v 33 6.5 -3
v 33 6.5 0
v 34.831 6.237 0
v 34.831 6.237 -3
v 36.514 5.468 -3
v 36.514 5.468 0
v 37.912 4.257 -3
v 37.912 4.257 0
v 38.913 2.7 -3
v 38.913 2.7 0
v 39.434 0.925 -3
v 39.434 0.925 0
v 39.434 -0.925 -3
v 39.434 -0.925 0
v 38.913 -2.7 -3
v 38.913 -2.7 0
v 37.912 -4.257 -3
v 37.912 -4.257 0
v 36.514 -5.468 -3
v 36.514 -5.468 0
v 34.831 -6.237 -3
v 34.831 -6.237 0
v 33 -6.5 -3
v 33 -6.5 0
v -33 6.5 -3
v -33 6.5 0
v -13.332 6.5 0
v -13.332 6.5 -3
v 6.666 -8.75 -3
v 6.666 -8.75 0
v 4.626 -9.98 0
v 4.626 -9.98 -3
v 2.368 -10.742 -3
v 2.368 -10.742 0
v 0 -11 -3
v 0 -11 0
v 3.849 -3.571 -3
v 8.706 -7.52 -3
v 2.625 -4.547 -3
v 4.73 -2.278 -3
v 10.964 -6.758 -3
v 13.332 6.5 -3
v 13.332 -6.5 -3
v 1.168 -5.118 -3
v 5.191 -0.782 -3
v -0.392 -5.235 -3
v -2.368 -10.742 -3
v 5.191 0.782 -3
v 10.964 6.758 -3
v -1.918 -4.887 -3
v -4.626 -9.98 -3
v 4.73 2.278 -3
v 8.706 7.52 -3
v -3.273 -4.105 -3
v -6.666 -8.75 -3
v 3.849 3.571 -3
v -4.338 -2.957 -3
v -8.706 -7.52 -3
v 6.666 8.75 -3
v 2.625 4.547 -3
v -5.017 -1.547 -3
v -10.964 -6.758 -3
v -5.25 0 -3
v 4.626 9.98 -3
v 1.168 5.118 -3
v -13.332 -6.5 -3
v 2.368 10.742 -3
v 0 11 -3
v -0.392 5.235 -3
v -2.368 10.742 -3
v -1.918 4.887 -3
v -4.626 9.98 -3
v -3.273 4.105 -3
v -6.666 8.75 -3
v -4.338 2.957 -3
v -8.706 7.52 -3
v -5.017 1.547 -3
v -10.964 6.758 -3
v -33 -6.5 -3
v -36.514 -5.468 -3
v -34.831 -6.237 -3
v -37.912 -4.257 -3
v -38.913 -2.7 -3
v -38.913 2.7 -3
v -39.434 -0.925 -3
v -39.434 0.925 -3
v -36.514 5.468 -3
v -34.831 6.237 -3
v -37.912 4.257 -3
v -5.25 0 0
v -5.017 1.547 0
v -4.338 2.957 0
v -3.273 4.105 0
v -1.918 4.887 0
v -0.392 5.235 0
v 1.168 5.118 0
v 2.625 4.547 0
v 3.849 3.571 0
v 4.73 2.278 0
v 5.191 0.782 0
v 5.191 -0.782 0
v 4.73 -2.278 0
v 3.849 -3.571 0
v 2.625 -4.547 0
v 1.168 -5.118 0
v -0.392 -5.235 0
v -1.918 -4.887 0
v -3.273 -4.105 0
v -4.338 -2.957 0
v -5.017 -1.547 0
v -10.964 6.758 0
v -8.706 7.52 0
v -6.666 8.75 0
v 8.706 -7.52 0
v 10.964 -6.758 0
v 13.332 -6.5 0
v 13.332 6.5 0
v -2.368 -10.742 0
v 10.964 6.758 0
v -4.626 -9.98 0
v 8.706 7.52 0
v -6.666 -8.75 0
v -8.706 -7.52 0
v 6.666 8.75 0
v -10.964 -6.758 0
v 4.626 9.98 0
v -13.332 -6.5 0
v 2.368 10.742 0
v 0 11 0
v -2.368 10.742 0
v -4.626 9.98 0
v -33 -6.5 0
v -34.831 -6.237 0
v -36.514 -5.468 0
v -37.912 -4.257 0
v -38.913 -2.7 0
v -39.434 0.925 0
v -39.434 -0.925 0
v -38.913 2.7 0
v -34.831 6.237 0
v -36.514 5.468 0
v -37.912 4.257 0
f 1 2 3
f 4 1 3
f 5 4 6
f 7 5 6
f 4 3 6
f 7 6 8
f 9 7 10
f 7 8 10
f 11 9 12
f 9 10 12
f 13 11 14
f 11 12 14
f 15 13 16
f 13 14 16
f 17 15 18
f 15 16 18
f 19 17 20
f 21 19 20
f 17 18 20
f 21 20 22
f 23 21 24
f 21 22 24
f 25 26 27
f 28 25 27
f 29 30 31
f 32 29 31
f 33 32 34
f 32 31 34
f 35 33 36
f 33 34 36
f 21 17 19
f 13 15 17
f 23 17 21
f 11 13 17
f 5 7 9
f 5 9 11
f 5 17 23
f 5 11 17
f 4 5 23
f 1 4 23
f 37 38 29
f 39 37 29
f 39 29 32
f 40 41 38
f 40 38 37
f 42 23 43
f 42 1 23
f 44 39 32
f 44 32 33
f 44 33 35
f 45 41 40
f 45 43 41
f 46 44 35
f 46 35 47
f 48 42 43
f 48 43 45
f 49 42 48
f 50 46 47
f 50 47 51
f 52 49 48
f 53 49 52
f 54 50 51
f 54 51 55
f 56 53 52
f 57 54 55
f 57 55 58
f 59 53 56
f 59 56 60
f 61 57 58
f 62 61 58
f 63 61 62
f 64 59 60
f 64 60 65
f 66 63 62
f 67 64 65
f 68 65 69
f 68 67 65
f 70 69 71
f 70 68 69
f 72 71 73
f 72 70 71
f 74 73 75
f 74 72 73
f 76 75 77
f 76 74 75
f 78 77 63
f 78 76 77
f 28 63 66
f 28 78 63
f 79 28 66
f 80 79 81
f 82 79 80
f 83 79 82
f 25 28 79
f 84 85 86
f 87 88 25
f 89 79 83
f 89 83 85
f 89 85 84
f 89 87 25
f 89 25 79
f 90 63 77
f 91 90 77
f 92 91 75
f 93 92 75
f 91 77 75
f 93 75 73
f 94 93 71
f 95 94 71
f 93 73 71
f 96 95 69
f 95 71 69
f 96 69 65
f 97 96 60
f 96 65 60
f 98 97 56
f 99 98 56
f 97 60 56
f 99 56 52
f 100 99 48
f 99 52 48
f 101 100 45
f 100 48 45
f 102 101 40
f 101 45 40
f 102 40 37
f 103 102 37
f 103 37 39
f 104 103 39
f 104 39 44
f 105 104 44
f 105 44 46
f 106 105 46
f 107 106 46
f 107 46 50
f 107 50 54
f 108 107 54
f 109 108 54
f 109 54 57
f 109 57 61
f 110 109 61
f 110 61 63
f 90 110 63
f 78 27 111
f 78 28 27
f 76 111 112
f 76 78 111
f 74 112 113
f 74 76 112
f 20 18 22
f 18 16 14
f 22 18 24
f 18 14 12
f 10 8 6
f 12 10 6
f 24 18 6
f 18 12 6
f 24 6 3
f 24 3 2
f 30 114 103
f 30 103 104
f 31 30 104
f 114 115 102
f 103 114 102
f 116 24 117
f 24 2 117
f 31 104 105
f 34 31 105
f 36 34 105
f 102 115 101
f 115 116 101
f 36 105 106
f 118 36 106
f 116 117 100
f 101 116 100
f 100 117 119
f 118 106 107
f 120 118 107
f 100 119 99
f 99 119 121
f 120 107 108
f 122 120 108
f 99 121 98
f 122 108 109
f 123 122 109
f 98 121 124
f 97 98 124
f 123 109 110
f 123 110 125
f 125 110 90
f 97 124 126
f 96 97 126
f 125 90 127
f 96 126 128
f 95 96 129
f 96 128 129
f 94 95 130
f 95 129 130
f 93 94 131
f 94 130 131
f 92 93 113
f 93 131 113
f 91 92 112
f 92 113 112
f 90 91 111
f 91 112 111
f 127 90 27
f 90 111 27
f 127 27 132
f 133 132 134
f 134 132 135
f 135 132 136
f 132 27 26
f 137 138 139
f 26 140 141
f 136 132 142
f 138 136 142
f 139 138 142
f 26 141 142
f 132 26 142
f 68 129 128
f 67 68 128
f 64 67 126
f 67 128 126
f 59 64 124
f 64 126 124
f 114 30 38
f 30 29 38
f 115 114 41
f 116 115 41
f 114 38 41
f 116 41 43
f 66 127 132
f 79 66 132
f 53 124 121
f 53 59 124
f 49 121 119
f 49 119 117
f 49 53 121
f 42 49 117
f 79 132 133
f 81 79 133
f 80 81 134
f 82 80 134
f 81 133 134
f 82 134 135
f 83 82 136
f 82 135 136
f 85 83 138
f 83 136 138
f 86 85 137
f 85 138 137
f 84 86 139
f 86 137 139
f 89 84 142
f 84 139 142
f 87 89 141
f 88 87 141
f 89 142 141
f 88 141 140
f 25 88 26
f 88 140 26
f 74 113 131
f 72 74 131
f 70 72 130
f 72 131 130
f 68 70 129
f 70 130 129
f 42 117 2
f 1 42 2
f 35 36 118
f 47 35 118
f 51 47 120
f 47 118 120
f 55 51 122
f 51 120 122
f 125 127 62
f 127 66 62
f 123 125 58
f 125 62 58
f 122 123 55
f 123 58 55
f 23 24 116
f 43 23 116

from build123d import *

# Parameters (mm, degrees)
FLANGE_BASE1_DEPTH    = 3
FILETE1_R             = 11
FILETE2_R             = 11
CORTE_EXTRUS_O1_REACH = 43.113
ESBO_O2_R             = 5.25


# Sheet-metal steps are written as plain solids
with BuildPart() as part:
    # Esboço1 → Flange-base1 (new body)
    with BuildSketch(Plane.XY):
        with BuildLine():
            Line((-33, 6.5), (-8.874119675, 6.5))
            ThreePointArc((-8.874119675, 6.5), (-4.974937186, 9.810708435), (0, 11))
            ThreePointArc((0, 11), (4.974937186, 9.810708435), (8.874119675, 6.5))
            Line((8.874119675, 6.5), (33, 6.5))
            ThreePointArc((33, 6.5), (39.5, 0), (33, -6.5))
            Line((33, -6.5), (8.874119675, -6.5))
            ThreePointArc((8.874119675, -6.5), (4.974937186, -9.810708435), (0, -11))
            ThreePointArc((0, -11), (-4.974937186, -9.810708435), (-8.874119675, -6.5))
            Line((-8.874119675, -6.5), (-33, -6.5))
            ThreePointArc((-33, -6.5), (-39.5, 0), (-33, 6.5))
        make_face()
    extrude(amount=-FLANGE_BASE1_DEPTH)

    # Filete1
    filete1_edges = [part.edges().sort_by_distance(p)[0] for p in [
        (-8.874119675, 6.5, -1.5),
    ]]
    fillet(filete1_edges, radius=FILETE1_R)

    # Filete2
    filete2_edges = [part.edges().sort_by_distance(p)[0] for p in [
        (8.874119675, -6.5, -1.5),
        (-8.874119675, -6.5, -1.5),
        (8.874119675, 6.5, -1.5),
    ]]
    fillet(filete2_edges, radius=FILETE2_R)

    # Esboço2 → Corte-extrusão1 (cut, up to next)
    with BuildSketch(Plane(origin=(0, 0, -3), x_dir=(-1, 0, 0), z_dir=(0, 0, -1)), mode=Mode.PRIVATE) as corte_extrus_o1_sk1:
        Circle(ESBO_O2_R)
    corte_extrus_o1_tool1 = extrude(corte_extrus_o1_sk1.sketch, amount=-CORTE_EXTRUS_O1_REACH, mode=Mode.PRIVATE) & part.part
    add(corte_extrus_o1_tool1.solids().sort_by_distance((0, 0, -3))[0], mode=Mode.SUBTRACT)


solid = part.part
